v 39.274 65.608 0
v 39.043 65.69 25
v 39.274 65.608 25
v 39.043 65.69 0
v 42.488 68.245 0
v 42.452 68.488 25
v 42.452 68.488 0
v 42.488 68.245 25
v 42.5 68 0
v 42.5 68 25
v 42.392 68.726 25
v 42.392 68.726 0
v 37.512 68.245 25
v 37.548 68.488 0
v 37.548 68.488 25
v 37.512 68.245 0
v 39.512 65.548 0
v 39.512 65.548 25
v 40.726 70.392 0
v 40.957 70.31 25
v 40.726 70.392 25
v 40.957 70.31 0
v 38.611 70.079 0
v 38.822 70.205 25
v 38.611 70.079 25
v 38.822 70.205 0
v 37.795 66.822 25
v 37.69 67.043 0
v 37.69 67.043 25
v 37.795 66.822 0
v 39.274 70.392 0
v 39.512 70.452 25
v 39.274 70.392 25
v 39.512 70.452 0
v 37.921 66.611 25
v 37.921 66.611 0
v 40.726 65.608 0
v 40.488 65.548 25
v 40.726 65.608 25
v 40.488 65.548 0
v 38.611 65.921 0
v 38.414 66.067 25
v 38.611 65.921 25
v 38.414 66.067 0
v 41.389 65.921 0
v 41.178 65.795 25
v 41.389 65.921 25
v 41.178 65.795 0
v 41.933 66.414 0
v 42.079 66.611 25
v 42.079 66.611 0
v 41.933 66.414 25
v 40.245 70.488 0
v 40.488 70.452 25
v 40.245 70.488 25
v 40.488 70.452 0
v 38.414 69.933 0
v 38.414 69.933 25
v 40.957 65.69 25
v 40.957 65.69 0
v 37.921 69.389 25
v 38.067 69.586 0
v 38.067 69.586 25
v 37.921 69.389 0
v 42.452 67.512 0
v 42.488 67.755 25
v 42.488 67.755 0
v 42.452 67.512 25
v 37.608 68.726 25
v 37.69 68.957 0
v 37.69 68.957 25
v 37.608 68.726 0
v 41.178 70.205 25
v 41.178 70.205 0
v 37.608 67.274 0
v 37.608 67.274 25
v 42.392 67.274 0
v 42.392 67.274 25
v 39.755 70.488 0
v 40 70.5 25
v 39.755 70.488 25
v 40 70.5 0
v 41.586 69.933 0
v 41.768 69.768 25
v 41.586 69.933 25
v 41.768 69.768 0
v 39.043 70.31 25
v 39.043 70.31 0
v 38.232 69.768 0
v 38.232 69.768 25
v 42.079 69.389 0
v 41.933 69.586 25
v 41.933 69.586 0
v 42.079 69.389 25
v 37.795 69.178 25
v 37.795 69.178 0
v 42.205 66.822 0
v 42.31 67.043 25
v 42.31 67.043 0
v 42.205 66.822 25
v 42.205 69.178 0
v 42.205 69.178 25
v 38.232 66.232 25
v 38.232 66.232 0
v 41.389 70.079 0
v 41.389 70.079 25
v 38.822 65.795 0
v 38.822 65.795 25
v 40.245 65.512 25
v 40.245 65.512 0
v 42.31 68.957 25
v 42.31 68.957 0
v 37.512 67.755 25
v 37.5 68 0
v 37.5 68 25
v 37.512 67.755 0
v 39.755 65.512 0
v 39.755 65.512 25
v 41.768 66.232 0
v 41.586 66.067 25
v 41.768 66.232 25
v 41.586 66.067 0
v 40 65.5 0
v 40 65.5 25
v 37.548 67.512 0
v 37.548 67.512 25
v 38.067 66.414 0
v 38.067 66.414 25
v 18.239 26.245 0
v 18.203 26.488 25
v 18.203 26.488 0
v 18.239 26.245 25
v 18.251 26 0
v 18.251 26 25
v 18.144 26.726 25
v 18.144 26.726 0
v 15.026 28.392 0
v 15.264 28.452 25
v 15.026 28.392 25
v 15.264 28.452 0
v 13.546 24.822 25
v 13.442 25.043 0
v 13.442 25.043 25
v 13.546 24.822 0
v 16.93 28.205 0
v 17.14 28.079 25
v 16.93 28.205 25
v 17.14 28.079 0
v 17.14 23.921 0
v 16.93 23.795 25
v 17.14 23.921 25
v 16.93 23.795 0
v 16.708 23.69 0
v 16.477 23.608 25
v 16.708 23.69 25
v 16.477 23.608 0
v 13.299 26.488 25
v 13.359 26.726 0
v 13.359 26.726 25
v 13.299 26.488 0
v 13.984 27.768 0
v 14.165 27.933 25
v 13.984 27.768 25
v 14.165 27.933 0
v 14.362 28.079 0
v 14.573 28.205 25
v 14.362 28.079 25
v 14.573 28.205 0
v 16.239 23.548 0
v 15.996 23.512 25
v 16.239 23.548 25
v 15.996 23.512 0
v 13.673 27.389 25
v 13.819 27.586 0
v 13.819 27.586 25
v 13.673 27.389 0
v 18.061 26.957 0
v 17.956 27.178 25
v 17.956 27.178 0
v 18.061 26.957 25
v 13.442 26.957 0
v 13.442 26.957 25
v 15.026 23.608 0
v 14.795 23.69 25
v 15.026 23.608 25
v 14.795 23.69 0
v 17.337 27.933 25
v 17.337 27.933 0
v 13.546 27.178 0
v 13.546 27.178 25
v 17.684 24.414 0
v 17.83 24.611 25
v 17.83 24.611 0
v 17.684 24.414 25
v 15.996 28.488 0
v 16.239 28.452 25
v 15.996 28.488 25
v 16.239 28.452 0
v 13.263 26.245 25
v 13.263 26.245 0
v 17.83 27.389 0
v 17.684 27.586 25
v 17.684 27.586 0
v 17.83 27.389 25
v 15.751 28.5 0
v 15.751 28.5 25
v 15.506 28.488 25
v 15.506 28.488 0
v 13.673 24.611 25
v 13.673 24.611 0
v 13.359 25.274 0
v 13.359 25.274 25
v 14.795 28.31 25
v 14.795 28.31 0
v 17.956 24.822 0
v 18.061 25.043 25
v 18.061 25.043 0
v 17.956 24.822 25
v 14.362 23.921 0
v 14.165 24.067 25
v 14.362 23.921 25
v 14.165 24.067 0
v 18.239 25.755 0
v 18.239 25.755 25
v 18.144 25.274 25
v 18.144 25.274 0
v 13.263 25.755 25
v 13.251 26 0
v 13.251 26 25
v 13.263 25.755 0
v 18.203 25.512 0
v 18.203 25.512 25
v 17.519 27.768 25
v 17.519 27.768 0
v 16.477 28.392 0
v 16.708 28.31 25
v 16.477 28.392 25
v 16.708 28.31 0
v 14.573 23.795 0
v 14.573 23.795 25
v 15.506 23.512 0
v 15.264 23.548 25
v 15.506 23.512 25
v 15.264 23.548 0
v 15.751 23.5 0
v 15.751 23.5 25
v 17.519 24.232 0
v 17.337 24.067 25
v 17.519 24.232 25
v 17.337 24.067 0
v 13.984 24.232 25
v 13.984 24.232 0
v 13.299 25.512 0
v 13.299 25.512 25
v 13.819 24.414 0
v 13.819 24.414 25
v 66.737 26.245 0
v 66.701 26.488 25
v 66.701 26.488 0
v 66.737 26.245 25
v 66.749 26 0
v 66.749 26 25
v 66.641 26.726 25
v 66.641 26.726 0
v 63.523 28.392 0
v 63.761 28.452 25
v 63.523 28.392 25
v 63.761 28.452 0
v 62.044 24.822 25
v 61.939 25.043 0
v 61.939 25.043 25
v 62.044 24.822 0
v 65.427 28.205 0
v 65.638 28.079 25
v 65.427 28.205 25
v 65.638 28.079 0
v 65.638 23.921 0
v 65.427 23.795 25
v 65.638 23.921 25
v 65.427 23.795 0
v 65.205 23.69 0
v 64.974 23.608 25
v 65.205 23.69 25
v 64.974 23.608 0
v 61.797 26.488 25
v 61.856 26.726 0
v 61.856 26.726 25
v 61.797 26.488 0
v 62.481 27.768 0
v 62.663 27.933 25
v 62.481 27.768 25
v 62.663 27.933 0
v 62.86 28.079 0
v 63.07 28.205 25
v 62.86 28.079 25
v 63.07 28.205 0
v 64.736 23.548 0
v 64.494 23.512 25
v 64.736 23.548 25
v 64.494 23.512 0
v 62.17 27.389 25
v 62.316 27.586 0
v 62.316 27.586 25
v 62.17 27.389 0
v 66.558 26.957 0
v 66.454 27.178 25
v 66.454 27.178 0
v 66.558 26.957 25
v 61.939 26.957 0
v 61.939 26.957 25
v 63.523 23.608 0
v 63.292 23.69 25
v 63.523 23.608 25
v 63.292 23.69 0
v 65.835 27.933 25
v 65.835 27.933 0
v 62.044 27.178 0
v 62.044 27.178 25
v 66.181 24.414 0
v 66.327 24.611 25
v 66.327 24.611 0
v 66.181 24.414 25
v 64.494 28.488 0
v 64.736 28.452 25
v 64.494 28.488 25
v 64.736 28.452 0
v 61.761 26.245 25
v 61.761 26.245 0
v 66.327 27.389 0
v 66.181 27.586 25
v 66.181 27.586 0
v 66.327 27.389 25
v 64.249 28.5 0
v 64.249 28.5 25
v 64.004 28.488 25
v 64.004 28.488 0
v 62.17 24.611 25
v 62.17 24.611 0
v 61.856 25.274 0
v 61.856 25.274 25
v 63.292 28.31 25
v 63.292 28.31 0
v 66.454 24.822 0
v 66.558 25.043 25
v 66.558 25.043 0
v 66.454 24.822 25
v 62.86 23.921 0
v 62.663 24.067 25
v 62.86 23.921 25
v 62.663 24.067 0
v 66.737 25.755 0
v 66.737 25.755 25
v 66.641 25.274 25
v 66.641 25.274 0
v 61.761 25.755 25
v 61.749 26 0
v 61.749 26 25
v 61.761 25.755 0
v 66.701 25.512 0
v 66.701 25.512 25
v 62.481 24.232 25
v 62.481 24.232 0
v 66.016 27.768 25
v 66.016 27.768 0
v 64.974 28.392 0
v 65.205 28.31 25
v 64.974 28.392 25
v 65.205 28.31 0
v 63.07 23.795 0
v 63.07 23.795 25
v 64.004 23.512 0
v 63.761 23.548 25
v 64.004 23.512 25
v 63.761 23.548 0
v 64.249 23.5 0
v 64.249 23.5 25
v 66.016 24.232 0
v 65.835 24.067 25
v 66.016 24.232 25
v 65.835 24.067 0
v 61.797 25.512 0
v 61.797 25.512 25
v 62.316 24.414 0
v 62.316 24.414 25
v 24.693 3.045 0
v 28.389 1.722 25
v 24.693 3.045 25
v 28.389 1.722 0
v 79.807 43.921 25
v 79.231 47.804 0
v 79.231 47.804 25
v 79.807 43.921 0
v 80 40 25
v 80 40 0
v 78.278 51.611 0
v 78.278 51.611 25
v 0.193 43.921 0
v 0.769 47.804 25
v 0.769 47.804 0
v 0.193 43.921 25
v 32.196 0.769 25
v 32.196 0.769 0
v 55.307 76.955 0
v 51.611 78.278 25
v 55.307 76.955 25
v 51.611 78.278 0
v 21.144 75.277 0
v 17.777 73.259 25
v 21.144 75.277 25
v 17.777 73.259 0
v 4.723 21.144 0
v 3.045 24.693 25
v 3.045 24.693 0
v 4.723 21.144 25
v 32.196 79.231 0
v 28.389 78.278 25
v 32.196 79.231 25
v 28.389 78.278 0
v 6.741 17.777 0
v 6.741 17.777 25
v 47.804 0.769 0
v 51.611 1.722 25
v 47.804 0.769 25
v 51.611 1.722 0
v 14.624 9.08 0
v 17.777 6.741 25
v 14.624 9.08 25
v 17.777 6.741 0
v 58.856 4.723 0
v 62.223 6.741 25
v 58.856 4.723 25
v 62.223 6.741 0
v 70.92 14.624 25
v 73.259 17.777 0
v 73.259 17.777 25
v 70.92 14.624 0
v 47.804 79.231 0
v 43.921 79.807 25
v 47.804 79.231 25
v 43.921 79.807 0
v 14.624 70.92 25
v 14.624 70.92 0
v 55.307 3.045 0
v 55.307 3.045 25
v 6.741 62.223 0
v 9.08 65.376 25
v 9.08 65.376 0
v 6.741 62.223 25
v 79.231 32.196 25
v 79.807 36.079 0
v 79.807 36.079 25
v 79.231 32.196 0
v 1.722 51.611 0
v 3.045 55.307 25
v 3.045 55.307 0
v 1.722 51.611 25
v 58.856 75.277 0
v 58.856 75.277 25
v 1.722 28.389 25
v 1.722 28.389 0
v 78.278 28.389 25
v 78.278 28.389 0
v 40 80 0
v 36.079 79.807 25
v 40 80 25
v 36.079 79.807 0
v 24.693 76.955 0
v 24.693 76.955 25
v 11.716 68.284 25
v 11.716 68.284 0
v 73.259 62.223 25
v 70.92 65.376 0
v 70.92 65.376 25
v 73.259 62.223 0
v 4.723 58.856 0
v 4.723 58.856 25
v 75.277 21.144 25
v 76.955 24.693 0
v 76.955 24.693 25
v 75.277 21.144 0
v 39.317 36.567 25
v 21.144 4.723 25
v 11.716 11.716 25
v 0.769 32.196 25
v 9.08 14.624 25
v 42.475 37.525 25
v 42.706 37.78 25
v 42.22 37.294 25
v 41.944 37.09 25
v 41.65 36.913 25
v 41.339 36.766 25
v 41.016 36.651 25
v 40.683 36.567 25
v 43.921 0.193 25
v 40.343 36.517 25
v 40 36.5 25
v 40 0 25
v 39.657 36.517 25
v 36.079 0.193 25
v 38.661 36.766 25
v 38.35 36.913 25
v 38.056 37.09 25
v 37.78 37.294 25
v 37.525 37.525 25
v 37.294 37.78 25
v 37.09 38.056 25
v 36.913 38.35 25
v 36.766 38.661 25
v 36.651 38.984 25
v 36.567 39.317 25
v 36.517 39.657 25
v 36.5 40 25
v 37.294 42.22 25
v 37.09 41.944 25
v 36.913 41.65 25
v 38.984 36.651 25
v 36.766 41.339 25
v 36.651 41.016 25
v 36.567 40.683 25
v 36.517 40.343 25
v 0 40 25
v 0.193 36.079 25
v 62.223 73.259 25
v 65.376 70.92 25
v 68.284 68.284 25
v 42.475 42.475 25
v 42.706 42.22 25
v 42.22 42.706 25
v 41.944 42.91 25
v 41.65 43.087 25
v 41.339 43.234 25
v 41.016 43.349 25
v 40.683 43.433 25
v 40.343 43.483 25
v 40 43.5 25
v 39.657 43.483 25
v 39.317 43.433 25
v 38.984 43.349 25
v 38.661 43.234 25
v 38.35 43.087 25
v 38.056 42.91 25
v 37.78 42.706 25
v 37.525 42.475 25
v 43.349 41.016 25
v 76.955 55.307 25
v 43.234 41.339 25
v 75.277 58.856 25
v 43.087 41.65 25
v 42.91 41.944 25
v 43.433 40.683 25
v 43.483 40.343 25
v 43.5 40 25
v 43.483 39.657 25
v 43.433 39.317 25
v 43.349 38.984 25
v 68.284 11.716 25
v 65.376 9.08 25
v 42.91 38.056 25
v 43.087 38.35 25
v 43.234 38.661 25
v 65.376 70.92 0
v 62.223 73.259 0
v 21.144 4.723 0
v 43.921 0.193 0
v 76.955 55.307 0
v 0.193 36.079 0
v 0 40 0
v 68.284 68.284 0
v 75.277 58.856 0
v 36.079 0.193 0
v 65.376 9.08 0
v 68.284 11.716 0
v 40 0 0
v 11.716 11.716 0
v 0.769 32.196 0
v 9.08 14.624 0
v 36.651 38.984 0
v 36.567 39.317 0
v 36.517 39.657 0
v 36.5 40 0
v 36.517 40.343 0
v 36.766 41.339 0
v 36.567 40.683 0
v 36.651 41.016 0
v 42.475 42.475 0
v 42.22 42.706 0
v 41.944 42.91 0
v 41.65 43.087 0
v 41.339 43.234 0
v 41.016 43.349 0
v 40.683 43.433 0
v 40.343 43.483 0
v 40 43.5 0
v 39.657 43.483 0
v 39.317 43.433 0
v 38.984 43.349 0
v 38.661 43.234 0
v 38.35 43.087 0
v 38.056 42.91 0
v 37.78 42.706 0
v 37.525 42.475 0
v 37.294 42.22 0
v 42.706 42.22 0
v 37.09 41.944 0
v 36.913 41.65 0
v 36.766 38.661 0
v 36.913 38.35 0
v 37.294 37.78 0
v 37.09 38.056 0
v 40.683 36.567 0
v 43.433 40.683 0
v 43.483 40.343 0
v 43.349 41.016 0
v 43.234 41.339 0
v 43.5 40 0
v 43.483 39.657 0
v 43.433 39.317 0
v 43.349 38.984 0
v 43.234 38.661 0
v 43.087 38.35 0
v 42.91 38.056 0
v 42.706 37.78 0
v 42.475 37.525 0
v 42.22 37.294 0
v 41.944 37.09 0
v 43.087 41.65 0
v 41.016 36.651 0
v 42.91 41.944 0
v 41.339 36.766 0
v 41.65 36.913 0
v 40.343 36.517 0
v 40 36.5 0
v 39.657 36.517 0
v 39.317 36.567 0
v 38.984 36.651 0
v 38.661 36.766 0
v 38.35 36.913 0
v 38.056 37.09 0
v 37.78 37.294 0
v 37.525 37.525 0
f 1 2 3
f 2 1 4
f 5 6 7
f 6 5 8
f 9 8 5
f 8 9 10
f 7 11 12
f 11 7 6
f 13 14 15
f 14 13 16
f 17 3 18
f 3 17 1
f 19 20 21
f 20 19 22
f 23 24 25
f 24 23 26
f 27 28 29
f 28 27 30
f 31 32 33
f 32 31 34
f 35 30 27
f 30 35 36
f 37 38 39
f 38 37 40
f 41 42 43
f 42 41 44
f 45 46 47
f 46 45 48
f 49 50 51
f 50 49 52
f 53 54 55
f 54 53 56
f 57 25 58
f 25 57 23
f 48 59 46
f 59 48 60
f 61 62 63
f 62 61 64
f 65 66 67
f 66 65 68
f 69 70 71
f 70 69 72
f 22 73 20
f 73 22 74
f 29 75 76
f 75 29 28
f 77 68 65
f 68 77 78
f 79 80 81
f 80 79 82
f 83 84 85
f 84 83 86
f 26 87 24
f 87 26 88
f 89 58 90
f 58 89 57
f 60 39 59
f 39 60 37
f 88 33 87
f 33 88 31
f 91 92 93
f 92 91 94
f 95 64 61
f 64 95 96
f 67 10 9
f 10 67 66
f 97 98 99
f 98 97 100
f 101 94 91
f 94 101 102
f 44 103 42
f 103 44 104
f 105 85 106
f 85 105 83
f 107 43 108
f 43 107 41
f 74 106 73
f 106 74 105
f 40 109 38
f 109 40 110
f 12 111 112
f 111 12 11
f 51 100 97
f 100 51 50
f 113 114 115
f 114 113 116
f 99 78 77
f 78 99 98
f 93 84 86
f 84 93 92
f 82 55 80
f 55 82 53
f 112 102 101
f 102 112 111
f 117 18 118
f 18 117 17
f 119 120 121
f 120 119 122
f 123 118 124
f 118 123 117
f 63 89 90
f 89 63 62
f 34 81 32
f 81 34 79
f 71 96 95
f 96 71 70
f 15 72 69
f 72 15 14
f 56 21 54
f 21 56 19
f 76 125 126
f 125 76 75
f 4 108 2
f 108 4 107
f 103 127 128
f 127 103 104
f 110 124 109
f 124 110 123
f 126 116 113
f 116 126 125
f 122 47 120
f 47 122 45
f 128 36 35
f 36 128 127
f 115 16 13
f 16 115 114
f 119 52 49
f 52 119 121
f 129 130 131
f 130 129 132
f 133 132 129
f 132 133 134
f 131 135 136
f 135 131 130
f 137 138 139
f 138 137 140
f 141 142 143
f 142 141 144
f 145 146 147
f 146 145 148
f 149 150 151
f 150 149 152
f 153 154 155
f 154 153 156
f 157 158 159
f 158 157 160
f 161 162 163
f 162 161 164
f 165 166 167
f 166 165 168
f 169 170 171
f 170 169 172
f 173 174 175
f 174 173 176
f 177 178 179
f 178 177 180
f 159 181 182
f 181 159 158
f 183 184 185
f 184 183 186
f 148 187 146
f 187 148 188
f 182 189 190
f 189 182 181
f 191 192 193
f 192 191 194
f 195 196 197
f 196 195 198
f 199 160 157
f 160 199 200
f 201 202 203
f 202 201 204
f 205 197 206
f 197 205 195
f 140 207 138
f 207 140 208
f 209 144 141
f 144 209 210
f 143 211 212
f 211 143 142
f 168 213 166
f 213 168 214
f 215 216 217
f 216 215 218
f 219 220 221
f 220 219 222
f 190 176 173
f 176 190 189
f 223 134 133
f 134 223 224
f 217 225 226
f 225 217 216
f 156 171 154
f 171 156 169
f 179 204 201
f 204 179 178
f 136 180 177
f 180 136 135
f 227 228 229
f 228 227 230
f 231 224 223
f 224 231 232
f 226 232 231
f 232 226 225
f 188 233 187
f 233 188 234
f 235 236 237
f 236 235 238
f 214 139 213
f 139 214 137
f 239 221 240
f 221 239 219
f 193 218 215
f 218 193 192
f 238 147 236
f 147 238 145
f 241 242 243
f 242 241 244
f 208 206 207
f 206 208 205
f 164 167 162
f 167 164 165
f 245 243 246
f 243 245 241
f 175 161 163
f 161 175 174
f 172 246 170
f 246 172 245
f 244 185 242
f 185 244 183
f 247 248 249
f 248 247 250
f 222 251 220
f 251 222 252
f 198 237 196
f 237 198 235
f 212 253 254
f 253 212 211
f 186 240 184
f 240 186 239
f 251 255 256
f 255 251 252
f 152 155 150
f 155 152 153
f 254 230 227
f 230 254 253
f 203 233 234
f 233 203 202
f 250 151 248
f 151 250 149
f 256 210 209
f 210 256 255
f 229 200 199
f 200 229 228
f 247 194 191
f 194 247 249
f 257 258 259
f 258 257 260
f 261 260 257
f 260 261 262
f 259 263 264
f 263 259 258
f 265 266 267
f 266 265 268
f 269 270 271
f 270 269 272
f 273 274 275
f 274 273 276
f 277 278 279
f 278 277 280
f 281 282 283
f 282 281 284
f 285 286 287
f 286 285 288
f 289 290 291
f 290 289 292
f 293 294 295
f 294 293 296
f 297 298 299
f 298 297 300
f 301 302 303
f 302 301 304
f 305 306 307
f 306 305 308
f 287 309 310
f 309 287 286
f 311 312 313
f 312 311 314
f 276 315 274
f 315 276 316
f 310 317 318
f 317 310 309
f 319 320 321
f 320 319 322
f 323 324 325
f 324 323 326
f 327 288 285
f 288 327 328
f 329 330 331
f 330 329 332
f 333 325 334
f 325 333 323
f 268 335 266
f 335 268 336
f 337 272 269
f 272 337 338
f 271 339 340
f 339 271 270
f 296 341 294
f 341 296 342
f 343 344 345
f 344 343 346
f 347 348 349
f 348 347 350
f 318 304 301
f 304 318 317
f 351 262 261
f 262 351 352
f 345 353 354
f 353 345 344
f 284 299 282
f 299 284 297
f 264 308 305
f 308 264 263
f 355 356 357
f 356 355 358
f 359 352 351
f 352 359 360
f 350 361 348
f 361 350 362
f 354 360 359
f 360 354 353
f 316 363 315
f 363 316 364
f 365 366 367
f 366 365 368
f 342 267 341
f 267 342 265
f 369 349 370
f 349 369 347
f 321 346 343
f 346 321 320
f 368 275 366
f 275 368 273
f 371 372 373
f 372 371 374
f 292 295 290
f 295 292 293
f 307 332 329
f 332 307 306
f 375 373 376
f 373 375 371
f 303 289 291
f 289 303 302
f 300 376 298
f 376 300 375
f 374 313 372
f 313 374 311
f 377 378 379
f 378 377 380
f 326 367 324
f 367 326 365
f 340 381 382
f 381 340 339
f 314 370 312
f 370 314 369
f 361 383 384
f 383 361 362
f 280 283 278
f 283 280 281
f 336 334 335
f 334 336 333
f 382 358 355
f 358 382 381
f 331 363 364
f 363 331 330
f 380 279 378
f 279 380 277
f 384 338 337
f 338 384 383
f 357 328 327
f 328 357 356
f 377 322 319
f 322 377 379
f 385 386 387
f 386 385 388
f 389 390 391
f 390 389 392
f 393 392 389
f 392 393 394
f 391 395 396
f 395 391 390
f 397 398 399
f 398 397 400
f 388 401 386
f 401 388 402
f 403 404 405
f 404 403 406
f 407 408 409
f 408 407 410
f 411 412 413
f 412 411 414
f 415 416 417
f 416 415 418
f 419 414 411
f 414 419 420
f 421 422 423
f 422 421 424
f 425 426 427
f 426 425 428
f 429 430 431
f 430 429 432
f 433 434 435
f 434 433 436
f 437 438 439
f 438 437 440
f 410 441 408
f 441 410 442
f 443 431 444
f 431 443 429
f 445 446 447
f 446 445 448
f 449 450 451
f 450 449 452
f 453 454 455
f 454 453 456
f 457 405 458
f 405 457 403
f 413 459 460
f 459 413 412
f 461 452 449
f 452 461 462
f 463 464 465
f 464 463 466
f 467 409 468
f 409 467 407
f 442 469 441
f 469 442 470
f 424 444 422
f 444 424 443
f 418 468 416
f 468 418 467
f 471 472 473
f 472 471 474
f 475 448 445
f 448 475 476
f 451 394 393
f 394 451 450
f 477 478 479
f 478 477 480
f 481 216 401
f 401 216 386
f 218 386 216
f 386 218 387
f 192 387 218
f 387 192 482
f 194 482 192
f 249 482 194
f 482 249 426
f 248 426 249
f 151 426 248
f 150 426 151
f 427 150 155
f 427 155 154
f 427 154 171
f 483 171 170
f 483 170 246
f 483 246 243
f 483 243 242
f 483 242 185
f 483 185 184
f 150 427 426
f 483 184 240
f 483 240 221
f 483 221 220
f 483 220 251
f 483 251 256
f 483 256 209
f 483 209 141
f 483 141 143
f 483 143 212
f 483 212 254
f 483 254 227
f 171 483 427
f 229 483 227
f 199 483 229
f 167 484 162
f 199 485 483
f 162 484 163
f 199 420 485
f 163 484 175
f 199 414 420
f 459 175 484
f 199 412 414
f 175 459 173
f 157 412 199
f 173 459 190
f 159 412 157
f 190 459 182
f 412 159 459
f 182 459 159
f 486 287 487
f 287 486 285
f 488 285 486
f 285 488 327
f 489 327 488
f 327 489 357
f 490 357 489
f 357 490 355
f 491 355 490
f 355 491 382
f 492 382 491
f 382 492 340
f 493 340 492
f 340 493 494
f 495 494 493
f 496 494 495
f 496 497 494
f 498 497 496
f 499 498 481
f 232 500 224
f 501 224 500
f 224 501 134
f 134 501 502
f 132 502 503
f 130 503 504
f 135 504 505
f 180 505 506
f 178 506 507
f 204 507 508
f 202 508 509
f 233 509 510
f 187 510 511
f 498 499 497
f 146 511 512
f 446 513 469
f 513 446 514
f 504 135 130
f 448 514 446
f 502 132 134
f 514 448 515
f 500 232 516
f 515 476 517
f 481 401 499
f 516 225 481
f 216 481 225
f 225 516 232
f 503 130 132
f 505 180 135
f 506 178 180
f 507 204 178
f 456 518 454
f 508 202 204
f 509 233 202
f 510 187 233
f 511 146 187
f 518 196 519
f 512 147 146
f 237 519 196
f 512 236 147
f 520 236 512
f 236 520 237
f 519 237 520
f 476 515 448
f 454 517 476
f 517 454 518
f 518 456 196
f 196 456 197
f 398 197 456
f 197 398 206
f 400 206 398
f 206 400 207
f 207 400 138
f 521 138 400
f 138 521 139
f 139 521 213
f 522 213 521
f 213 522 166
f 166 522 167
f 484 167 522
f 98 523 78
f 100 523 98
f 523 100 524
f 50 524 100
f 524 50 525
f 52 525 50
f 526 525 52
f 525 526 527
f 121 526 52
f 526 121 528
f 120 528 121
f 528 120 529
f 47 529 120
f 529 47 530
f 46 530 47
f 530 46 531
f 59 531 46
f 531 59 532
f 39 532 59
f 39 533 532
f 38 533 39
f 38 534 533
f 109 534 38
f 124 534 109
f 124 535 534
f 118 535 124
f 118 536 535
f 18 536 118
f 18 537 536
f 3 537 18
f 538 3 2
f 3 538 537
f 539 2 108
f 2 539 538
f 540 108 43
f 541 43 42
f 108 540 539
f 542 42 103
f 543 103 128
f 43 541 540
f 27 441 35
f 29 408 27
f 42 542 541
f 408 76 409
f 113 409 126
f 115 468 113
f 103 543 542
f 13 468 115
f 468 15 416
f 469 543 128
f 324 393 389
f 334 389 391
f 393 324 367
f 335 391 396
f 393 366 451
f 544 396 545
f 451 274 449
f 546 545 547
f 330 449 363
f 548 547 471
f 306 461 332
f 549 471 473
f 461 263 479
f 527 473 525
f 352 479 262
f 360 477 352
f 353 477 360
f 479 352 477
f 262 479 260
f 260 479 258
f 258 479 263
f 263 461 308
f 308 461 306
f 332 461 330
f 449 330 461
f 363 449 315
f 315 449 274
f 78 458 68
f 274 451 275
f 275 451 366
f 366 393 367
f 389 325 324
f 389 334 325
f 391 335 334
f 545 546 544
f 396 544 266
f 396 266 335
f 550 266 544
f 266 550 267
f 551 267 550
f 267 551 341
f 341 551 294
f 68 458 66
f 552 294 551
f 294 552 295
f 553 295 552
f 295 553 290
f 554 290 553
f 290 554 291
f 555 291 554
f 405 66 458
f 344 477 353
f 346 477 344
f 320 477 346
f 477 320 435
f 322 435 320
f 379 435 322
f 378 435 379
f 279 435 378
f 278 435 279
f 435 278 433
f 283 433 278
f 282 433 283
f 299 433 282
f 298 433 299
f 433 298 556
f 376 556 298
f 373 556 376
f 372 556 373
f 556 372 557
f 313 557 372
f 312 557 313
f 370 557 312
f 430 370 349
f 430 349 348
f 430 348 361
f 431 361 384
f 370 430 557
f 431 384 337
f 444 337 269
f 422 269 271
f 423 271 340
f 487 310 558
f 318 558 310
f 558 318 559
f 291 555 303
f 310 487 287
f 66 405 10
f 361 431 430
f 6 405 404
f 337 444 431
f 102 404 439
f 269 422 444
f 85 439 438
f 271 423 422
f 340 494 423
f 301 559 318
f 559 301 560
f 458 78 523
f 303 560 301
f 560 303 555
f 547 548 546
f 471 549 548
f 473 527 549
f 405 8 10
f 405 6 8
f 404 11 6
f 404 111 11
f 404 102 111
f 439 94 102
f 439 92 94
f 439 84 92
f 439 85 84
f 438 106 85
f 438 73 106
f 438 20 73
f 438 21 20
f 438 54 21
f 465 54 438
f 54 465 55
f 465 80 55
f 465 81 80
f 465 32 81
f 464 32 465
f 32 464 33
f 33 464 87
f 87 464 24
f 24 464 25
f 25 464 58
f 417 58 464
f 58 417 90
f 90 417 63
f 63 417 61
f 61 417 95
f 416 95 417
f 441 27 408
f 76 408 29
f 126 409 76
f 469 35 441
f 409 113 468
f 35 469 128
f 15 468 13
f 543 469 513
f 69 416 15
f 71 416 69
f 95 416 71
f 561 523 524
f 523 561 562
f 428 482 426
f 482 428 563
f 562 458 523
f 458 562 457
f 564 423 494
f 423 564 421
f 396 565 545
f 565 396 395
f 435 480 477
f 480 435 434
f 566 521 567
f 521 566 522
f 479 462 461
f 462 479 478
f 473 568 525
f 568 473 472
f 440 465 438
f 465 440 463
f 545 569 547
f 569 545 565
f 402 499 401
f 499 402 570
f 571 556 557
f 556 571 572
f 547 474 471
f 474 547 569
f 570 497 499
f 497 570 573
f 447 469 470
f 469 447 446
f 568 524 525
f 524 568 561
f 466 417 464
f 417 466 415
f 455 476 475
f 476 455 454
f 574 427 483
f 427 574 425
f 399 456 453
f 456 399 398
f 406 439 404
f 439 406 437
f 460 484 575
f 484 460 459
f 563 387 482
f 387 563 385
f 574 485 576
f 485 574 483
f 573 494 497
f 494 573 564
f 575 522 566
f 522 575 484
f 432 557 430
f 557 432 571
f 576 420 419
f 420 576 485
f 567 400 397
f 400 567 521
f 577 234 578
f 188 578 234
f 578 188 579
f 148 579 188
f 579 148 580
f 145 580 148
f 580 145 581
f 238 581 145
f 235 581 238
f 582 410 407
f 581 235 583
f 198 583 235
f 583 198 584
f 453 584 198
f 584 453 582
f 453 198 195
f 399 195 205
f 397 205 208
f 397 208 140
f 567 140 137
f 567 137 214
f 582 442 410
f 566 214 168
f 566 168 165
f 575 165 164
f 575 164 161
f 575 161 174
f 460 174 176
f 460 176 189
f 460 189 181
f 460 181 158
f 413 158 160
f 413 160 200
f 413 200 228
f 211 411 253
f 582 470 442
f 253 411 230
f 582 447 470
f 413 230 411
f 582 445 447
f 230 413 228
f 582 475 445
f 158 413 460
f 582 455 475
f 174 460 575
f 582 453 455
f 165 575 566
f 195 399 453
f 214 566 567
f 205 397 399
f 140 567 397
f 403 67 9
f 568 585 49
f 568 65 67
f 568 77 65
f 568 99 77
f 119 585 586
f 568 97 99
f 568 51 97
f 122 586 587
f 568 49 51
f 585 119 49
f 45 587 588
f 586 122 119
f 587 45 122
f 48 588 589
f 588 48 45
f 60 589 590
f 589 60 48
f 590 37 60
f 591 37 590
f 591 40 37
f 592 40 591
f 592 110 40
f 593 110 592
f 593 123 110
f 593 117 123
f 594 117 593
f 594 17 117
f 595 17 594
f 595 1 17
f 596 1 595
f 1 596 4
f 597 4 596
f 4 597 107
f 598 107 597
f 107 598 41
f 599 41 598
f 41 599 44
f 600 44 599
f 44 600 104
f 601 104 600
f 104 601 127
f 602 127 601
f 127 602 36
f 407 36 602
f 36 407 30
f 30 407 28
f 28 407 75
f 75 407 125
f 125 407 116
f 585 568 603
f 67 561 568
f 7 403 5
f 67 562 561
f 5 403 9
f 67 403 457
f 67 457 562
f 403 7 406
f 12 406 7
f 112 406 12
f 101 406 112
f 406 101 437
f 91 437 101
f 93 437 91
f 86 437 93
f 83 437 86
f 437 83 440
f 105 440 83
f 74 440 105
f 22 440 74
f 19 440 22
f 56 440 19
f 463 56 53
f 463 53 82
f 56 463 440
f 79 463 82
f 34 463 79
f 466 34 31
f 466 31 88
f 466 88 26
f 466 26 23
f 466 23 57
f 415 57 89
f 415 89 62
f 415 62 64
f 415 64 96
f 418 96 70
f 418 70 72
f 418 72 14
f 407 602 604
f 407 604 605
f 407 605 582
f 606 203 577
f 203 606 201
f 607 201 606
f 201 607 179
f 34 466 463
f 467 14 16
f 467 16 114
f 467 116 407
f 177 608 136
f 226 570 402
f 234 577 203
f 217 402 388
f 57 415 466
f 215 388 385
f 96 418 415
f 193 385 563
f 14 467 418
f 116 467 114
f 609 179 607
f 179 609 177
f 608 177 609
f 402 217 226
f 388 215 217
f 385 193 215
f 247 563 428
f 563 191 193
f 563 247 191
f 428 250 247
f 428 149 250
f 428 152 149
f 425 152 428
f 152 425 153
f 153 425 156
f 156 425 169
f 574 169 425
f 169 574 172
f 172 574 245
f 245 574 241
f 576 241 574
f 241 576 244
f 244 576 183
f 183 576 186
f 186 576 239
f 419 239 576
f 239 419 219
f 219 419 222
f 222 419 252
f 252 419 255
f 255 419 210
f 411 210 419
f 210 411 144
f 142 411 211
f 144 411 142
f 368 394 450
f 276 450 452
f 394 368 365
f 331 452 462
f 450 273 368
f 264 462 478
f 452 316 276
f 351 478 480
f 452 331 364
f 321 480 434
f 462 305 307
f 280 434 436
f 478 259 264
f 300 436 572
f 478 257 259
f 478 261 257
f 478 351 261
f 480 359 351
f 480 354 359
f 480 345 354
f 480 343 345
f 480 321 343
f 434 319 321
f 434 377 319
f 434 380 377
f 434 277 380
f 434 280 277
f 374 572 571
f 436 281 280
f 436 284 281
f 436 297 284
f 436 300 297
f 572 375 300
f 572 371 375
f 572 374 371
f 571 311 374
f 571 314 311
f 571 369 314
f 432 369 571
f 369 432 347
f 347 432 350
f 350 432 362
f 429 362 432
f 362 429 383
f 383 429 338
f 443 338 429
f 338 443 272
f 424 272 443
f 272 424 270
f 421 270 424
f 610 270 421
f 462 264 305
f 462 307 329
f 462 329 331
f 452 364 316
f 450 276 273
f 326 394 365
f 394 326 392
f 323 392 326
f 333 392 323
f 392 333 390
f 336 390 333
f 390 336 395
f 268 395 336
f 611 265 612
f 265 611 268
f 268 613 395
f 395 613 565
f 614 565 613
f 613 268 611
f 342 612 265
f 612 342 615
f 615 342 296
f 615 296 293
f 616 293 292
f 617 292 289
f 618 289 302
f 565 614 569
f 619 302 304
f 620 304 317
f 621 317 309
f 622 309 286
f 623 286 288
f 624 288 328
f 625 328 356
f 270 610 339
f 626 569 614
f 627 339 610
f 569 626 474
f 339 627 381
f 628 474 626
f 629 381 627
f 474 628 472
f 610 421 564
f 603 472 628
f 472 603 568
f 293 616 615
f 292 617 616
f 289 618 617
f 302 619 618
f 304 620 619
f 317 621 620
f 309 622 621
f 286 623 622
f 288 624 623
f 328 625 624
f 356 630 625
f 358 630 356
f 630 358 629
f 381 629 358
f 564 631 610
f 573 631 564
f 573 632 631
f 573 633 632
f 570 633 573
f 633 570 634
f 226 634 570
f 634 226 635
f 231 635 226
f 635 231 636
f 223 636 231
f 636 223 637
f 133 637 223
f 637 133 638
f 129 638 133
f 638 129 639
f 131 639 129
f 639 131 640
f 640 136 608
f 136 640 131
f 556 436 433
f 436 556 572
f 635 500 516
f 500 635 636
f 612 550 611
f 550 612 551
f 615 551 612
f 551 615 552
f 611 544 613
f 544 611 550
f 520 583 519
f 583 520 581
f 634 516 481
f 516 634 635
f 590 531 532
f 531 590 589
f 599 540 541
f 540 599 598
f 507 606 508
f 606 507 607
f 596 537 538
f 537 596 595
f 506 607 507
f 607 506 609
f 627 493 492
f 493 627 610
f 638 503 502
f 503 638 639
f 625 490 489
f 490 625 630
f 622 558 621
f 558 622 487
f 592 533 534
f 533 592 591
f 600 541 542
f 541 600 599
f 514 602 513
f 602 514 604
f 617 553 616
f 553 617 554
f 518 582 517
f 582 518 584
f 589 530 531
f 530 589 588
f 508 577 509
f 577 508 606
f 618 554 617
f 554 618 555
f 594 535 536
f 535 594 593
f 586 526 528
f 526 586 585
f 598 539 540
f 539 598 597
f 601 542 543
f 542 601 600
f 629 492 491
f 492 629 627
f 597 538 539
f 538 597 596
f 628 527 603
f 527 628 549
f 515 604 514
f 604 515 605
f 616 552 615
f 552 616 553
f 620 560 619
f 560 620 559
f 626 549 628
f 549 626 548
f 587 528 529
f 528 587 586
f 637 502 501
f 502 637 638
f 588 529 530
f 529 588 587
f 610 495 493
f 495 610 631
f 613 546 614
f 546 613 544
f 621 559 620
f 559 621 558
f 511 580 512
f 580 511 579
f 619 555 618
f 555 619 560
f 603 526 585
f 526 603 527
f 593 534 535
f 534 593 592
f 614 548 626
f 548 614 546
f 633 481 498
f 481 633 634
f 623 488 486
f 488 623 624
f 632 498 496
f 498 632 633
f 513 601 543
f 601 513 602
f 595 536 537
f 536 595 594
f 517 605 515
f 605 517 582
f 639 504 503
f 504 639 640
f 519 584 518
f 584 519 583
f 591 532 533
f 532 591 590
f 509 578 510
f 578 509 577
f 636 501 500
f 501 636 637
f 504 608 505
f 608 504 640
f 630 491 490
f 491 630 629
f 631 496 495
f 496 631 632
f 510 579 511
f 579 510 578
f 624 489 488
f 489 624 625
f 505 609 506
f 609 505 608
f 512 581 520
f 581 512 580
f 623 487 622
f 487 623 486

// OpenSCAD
// scad/tripod_mount_base.scad
// Parametric tripod camera mount base.
//
// Circular platform with a central 1/4-20 bolt hole and three symmetric
// leg attachment points at 120° intervals. Optimized for vertical camera load
// transmitted through the central bolt to three legs.
//
// All caps variables are injected via -D flags from openscad_runner.py.

// ── Parameters ────────────────────────────────────────────────────────────
DIAMETER            = 80.0;   // bounding circle diameter — also sets bbox X and Y
HEIGHT              = 25.0;   // platform thickness (Z)
CENTER_HOLE_D       = 7.0;    // 1/4-20 clearance hole (6.35mm + clearance)
LEG_HOLE_D          = 5.0;    // M4 leg attachment holes
LEG_HOLE_RADIUS     = 28.0;   // radial distance from center to leg holes (mm)
FIRST_LEG_ANGLE     = 90.0;   // rotation of first leg (degrees)

// ── Derived ───────────────────────────────────────────────────────────────
fn_curve = 64;
radius   = DIAMETER / 2;
cx       = DIAMETER / 2;
cy       = DIAMETER / 2;

// ── Modules ───────────────────────────────────────────────────────────────
module platform() {
    translate([cx, cy, 0])
        cylinder(r=radius, h=HEIGHT, $fn=fn_curve);
}

module center_hole() {
    translate([cx, cy, -1])
        cylinder(r=CENTER_HOLE_D / 2, h=HEIGHT + 2, $fn=fn_curve);
}

module leg_holes() {
    for (i = [0 : 2]) {
        angle = FIRST_LEG_ANGLE + i * 120;
        lx = cx + LEG_HOLE_RADIUS * cos(angle);
        ly = cy + LEG_HOLE_RADIUS * sin(angle);
        translate([lx, ly, -1])
            cylinder(r=LEG_HOLE_D / 2, h=HEIGHT + 2, $fn=fn_curve);
    }
}

// ── Assembly ──────────────────────────────────────────────────────────────
difference() {
    platform();
    center_hole();
    leg_holes();
}
